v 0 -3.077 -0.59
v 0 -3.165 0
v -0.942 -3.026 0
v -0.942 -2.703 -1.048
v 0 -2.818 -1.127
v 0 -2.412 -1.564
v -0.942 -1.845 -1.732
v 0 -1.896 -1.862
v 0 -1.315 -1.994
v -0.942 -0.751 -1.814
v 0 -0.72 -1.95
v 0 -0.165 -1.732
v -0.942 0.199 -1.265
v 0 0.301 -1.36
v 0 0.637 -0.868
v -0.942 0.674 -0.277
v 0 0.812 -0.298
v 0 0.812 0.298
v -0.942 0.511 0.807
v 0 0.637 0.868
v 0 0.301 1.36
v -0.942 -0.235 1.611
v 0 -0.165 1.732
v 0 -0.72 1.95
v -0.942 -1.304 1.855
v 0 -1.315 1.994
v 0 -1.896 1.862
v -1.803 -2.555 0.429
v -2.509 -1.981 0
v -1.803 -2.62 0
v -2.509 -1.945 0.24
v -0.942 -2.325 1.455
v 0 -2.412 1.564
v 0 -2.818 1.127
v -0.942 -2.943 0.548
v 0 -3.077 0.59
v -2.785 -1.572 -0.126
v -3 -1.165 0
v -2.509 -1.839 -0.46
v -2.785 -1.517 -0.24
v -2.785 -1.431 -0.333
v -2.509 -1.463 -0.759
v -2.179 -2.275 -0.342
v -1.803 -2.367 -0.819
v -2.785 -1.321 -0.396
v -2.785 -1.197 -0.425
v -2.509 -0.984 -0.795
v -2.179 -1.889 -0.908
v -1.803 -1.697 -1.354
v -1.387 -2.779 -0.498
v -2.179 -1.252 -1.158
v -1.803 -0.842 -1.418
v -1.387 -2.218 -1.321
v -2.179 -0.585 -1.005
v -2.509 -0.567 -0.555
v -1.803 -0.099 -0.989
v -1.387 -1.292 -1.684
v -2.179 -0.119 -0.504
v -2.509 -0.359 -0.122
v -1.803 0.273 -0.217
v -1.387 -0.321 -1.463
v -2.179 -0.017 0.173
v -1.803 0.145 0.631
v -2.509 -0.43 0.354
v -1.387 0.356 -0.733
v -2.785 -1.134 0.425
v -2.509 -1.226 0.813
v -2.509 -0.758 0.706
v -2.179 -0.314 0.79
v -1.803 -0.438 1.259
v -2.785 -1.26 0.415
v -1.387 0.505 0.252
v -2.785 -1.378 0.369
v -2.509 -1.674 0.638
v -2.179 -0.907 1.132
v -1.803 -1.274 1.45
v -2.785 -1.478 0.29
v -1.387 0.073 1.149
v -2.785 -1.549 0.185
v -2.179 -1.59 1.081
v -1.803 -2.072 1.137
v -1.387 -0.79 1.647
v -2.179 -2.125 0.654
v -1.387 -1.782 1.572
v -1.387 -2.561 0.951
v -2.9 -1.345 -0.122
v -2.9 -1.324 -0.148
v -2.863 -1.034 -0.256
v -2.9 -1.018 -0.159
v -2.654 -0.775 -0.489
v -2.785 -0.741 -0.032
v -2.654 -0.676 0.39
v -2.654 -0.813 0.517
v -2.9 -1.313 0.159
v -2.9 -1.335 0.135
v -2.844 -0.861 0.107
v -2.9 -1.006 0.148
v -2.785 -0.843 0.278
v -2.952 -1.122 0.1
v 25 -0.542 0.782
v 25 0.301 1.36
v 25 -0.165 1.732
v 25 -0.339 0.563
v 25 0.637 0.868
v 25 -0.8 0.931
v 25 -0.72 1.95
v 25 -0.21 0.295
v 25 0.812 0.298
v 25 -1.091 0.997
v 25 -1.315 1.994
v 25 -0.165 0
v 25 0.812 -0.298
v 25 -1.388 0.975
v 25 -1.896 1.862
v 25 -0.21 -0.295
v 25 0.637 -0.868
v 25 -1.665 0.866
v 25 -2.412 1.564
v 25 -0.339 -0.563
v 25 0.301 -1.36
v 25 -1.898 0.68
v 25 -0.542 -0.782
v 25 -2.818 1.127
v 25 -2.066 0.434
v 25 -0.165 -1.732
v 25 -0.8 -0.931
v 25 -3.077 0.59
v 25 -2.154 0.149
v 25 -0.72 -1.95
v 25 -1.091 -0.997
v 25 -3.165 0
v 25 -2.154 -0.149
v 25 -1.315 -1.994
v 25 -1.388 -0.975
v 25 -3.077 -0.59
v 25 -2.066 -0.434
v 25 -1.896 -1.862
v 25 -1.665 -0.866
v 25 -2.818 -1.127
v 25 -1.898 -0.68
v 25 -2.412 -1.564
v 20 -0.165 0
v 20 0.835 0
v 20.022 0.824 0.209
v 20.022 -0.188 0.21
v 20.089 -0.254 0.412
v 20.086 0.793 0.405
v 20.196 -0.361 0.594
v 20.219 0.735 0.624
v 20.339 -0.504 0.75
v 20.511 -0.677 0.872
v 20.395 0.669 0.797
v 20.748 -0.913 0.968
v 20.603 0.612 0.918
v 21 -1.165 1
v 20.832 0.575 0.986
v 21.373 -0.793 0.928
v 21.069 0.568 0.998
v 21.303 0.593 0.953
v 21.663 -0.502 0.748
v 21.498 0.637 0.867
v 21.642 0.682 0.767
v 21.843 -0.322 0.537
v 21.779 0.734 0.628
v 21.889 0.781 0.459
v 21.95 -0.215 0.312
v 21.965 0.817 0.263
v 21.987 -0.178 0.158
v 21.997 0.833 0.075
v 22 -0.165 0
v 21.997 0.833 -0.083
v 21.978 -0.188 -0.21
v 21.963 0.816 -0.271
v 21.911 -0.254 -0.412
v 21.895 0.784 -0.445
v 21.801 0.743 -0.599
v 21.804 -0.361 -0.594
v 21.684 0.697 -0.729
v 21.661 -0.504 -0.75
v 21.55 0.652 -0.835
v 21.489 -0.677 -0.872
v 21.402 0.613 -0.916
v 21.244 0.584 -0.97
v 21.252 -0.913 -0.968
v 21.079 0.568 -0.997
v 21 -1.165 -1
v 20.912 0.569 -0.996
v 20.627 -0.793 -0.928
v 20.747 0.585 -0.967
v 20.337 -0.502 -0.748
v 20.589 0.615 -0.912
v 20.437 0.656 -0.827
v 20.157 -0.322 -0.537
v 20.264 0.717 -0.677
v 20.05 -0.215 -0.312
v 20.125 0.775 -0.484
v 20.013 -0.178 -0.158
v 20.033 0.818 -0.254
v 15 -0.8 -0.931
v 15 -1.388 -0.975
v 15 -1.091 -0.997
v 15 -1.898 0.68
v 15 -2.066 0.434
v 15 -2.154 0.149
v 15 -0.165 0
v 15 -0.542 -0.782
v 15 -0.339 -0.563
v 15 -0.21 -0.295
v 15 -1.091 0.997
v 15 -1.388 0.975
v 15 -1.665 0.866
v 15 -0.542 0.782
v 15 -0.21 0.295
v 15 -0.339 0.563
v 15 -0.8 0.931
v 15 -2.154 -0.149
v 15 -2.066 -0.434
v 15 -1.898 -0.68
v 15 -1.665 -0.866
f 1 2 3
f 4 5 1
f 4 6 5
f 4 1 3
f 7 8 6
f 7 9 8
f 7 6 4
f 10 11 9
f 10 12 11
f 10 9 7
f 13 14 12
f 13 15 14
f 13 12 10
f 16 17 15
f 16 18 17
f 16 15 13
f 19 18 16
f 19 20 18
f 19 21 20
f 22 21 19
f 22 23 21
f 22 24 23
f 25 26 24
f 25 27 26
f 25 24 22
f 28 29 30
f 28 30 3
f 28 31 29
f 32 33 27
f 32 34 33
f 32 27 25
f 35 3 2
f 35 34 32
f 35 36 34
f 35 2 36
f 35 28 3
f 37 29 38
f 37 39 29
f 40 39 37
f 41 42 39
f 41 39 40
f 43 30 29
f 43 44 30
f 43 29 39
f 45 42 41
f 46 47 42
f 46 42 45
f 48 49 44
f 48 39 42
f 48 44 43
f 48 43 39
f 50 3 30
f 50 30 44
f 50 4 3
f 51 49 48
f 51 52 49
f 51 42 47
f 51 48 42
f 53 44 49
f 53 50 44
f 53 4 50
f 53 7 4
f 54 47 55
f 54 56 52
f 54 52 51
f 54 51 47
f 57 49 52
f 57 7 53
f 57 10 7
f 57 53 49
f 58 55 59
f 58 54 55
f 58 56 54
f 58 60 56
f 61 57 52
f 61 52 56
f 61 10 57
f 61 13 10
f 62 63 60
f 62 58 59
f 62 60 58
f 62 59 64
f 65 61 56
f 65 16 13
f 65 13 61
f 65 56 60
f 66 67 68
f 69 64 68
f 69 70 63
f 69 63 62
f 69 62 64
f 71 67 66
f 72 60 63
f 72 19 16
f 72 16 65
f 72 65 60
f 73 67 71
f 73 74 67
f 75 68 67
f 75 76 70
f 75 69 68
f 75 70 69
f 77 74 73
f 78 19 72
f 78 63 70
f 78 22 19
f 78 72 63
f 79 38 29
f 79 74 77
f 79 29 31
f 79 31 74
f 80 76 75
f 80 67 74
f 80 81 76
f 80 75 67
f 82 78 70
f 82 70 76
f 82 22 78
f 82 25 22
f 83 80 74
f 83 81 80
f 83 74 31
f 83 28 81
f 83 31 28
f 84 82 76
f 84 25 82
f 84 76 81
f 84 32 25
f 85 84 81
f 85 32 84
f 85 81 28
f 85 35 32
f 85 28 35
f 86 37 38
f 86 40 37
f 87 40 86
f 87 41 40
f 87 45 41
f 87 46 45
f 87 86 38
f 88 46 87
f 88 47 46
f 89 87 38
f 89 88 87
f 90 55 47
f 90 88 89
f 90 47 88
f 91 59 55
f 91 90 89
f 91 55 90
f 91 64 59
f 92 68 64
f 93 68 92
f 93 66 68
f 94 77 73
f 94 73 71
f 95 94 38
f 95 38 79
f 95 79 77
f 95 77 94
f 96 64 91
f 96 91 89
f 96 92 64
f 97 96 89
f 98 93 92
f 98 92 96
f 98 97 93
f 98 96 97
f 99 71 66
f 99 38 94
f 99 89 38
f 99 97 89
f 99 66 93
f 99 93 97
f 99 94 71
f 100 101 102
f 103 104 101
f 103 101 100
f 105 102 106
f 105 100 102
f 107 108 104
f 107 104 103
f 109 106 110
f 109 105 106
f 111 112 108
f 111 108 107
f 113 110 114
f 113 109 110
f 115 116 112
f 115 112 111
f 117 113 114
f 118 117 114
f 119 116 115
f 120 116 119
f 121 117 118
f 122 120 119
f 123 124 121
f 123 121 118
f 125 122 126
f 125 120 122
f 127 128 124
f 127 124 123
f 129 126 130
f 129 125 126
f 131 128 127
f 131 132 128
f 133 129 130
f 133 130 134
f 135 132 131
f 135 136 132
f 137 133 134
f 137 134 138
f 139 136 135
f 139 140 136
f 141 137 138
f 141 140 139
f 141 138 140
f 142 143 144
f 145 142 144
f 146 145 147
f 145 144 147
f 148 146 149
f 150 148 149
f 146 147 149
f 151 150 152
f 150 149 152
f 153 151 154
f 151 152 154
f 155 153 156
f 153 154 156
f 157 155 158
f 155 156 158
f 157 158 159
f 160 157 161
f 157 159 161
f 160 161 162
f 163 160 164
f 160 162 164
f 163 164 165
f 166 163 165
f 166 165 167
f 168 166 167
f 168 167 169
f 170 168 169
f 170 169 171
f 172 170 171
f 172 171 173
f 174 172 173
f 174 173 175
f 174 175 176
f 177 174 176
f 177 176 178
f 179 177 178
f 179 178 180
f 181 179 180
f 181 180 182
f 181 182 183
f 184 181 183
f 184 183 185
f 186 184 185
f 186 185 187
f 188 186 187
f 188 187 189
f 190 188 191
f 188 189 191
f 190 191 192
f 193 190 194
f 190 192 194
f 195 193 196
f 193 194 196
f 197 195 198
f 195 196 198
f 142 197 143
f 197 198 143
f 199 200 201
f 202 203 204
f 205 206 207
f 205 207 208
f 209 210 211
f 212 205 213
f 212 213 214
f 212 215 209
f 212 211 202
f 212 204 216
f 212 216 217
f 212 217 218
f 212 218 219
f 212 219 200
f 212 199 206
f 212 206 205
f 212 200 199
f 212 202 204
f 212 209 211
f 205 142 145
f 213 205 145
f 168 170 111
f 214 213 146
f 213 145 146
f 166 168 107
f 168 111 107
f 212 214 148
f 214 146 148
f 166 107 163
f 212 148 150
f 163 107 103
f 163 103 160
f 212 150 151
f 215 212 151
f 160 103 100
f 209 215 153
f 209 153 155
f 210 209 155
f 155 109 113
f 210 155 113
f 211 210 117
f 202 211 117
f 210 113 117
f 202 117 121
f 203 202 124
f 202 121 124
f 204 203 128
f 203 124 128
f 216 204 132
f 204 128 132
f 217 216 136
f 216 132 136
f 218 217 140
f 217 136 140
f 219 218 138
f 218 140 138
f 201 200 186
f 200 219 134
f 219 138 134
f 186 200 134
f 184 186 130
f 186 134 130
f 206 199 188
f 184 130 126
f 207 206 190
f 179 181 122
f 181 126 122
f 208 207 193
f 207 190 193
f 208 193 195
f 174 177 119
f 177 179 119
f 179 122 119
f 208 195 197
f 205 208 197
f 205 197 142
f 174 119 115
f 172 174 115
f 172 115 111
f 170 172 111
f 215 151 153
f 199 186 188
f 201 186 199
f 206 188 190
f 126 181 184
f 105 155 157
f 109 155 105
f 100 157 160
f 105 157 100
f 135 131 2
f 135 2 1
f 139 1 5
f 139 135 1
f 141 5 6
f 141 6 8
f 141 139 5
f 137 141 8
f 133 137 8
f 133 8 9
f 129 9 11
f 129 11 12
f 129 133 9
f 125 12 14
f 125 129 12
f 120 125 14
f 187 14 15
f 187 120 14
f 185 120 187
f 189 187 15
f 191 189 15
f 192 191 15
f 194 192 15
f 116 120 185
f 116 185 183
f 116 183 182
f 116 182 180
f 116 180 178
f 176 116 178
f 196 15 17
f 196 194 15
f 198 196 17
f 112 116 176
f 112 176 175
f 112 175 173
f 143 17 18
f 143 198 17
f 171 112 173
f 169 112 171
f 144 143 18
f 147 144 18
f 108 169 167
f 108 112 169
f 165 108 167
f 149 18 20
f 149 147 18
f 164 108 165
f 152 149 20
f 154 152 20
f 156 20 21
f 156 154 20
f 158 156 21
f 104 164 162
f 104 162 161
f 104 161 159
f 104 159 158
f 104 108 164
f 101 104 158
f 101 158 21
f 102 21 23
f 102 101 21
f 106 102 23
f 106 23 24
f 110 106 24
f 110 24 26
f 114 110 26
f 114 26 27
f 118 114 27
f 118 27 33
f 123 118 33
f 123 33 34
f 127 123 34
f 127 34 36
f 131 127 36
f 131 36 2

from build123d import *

# Parameters (mm, degrees)
SKETCH4_R          = 1
CUT_EXTRUDE1_DEPTH = 2
SKETCH5_R          = 1
CUT_EXTRUDE2_DEPTH = 10


with BuildPart() as part:
    # Sketch1 → Revolve1 (revolve)
    with BuildSketch(Plane.XY, mode=Mode.PRIVATE) as revolve1_sk:
        with BuildLine():
            Line((0, 0.8346352), (25, 0.8346352))
            Line((25, 0.8346352), (25, -1.1653648))
            Line((25, -1.1653648), (-3, -1.1653648))
            ThreePointArc((-3, -1.1653648), (-1.802775638, 0.288798657), (0, 0.8346352))
        make_face()
    revolve(revolve1_sk.sketch.rotate(Axis((-3, -1.1653648, 0), (1, 0, 0)), 180), axis=Axis((-3, -1.1653648, 0), (1, 0, 0)))

    # Sketch4 → Cut-Extrude1 (cut)
    with BuildSketch(Plane(origin=(0, 0.8346352, 0), x_dir=(1, 0, 0), z_dir=(0, 1, 0))):
        with Locations(Location((21, 0, 0), (0, 0, 180))):
            Circle(SKETCH4_R)
    extrude(amount=-CUT_EXTRUDE1_DEPTH, mode=Mode.SUBTRACT)

    # Sketch5 → Cut-Extrude2 (cut)
    with BuildSketch(Plane(origin=(25, 0, 0), x_dir=(0, 0, -1), z_dir=(1, 0, 0))):
        with Locations(Location((0, -1.1653648, 0), (0, 0, 90))):
            Circle(SKETCH5_R)
    extrude(amount=-CUT_EXTRUDE2_DEPTH, mode=Mode.SUBTRACT)


solid = part.part
